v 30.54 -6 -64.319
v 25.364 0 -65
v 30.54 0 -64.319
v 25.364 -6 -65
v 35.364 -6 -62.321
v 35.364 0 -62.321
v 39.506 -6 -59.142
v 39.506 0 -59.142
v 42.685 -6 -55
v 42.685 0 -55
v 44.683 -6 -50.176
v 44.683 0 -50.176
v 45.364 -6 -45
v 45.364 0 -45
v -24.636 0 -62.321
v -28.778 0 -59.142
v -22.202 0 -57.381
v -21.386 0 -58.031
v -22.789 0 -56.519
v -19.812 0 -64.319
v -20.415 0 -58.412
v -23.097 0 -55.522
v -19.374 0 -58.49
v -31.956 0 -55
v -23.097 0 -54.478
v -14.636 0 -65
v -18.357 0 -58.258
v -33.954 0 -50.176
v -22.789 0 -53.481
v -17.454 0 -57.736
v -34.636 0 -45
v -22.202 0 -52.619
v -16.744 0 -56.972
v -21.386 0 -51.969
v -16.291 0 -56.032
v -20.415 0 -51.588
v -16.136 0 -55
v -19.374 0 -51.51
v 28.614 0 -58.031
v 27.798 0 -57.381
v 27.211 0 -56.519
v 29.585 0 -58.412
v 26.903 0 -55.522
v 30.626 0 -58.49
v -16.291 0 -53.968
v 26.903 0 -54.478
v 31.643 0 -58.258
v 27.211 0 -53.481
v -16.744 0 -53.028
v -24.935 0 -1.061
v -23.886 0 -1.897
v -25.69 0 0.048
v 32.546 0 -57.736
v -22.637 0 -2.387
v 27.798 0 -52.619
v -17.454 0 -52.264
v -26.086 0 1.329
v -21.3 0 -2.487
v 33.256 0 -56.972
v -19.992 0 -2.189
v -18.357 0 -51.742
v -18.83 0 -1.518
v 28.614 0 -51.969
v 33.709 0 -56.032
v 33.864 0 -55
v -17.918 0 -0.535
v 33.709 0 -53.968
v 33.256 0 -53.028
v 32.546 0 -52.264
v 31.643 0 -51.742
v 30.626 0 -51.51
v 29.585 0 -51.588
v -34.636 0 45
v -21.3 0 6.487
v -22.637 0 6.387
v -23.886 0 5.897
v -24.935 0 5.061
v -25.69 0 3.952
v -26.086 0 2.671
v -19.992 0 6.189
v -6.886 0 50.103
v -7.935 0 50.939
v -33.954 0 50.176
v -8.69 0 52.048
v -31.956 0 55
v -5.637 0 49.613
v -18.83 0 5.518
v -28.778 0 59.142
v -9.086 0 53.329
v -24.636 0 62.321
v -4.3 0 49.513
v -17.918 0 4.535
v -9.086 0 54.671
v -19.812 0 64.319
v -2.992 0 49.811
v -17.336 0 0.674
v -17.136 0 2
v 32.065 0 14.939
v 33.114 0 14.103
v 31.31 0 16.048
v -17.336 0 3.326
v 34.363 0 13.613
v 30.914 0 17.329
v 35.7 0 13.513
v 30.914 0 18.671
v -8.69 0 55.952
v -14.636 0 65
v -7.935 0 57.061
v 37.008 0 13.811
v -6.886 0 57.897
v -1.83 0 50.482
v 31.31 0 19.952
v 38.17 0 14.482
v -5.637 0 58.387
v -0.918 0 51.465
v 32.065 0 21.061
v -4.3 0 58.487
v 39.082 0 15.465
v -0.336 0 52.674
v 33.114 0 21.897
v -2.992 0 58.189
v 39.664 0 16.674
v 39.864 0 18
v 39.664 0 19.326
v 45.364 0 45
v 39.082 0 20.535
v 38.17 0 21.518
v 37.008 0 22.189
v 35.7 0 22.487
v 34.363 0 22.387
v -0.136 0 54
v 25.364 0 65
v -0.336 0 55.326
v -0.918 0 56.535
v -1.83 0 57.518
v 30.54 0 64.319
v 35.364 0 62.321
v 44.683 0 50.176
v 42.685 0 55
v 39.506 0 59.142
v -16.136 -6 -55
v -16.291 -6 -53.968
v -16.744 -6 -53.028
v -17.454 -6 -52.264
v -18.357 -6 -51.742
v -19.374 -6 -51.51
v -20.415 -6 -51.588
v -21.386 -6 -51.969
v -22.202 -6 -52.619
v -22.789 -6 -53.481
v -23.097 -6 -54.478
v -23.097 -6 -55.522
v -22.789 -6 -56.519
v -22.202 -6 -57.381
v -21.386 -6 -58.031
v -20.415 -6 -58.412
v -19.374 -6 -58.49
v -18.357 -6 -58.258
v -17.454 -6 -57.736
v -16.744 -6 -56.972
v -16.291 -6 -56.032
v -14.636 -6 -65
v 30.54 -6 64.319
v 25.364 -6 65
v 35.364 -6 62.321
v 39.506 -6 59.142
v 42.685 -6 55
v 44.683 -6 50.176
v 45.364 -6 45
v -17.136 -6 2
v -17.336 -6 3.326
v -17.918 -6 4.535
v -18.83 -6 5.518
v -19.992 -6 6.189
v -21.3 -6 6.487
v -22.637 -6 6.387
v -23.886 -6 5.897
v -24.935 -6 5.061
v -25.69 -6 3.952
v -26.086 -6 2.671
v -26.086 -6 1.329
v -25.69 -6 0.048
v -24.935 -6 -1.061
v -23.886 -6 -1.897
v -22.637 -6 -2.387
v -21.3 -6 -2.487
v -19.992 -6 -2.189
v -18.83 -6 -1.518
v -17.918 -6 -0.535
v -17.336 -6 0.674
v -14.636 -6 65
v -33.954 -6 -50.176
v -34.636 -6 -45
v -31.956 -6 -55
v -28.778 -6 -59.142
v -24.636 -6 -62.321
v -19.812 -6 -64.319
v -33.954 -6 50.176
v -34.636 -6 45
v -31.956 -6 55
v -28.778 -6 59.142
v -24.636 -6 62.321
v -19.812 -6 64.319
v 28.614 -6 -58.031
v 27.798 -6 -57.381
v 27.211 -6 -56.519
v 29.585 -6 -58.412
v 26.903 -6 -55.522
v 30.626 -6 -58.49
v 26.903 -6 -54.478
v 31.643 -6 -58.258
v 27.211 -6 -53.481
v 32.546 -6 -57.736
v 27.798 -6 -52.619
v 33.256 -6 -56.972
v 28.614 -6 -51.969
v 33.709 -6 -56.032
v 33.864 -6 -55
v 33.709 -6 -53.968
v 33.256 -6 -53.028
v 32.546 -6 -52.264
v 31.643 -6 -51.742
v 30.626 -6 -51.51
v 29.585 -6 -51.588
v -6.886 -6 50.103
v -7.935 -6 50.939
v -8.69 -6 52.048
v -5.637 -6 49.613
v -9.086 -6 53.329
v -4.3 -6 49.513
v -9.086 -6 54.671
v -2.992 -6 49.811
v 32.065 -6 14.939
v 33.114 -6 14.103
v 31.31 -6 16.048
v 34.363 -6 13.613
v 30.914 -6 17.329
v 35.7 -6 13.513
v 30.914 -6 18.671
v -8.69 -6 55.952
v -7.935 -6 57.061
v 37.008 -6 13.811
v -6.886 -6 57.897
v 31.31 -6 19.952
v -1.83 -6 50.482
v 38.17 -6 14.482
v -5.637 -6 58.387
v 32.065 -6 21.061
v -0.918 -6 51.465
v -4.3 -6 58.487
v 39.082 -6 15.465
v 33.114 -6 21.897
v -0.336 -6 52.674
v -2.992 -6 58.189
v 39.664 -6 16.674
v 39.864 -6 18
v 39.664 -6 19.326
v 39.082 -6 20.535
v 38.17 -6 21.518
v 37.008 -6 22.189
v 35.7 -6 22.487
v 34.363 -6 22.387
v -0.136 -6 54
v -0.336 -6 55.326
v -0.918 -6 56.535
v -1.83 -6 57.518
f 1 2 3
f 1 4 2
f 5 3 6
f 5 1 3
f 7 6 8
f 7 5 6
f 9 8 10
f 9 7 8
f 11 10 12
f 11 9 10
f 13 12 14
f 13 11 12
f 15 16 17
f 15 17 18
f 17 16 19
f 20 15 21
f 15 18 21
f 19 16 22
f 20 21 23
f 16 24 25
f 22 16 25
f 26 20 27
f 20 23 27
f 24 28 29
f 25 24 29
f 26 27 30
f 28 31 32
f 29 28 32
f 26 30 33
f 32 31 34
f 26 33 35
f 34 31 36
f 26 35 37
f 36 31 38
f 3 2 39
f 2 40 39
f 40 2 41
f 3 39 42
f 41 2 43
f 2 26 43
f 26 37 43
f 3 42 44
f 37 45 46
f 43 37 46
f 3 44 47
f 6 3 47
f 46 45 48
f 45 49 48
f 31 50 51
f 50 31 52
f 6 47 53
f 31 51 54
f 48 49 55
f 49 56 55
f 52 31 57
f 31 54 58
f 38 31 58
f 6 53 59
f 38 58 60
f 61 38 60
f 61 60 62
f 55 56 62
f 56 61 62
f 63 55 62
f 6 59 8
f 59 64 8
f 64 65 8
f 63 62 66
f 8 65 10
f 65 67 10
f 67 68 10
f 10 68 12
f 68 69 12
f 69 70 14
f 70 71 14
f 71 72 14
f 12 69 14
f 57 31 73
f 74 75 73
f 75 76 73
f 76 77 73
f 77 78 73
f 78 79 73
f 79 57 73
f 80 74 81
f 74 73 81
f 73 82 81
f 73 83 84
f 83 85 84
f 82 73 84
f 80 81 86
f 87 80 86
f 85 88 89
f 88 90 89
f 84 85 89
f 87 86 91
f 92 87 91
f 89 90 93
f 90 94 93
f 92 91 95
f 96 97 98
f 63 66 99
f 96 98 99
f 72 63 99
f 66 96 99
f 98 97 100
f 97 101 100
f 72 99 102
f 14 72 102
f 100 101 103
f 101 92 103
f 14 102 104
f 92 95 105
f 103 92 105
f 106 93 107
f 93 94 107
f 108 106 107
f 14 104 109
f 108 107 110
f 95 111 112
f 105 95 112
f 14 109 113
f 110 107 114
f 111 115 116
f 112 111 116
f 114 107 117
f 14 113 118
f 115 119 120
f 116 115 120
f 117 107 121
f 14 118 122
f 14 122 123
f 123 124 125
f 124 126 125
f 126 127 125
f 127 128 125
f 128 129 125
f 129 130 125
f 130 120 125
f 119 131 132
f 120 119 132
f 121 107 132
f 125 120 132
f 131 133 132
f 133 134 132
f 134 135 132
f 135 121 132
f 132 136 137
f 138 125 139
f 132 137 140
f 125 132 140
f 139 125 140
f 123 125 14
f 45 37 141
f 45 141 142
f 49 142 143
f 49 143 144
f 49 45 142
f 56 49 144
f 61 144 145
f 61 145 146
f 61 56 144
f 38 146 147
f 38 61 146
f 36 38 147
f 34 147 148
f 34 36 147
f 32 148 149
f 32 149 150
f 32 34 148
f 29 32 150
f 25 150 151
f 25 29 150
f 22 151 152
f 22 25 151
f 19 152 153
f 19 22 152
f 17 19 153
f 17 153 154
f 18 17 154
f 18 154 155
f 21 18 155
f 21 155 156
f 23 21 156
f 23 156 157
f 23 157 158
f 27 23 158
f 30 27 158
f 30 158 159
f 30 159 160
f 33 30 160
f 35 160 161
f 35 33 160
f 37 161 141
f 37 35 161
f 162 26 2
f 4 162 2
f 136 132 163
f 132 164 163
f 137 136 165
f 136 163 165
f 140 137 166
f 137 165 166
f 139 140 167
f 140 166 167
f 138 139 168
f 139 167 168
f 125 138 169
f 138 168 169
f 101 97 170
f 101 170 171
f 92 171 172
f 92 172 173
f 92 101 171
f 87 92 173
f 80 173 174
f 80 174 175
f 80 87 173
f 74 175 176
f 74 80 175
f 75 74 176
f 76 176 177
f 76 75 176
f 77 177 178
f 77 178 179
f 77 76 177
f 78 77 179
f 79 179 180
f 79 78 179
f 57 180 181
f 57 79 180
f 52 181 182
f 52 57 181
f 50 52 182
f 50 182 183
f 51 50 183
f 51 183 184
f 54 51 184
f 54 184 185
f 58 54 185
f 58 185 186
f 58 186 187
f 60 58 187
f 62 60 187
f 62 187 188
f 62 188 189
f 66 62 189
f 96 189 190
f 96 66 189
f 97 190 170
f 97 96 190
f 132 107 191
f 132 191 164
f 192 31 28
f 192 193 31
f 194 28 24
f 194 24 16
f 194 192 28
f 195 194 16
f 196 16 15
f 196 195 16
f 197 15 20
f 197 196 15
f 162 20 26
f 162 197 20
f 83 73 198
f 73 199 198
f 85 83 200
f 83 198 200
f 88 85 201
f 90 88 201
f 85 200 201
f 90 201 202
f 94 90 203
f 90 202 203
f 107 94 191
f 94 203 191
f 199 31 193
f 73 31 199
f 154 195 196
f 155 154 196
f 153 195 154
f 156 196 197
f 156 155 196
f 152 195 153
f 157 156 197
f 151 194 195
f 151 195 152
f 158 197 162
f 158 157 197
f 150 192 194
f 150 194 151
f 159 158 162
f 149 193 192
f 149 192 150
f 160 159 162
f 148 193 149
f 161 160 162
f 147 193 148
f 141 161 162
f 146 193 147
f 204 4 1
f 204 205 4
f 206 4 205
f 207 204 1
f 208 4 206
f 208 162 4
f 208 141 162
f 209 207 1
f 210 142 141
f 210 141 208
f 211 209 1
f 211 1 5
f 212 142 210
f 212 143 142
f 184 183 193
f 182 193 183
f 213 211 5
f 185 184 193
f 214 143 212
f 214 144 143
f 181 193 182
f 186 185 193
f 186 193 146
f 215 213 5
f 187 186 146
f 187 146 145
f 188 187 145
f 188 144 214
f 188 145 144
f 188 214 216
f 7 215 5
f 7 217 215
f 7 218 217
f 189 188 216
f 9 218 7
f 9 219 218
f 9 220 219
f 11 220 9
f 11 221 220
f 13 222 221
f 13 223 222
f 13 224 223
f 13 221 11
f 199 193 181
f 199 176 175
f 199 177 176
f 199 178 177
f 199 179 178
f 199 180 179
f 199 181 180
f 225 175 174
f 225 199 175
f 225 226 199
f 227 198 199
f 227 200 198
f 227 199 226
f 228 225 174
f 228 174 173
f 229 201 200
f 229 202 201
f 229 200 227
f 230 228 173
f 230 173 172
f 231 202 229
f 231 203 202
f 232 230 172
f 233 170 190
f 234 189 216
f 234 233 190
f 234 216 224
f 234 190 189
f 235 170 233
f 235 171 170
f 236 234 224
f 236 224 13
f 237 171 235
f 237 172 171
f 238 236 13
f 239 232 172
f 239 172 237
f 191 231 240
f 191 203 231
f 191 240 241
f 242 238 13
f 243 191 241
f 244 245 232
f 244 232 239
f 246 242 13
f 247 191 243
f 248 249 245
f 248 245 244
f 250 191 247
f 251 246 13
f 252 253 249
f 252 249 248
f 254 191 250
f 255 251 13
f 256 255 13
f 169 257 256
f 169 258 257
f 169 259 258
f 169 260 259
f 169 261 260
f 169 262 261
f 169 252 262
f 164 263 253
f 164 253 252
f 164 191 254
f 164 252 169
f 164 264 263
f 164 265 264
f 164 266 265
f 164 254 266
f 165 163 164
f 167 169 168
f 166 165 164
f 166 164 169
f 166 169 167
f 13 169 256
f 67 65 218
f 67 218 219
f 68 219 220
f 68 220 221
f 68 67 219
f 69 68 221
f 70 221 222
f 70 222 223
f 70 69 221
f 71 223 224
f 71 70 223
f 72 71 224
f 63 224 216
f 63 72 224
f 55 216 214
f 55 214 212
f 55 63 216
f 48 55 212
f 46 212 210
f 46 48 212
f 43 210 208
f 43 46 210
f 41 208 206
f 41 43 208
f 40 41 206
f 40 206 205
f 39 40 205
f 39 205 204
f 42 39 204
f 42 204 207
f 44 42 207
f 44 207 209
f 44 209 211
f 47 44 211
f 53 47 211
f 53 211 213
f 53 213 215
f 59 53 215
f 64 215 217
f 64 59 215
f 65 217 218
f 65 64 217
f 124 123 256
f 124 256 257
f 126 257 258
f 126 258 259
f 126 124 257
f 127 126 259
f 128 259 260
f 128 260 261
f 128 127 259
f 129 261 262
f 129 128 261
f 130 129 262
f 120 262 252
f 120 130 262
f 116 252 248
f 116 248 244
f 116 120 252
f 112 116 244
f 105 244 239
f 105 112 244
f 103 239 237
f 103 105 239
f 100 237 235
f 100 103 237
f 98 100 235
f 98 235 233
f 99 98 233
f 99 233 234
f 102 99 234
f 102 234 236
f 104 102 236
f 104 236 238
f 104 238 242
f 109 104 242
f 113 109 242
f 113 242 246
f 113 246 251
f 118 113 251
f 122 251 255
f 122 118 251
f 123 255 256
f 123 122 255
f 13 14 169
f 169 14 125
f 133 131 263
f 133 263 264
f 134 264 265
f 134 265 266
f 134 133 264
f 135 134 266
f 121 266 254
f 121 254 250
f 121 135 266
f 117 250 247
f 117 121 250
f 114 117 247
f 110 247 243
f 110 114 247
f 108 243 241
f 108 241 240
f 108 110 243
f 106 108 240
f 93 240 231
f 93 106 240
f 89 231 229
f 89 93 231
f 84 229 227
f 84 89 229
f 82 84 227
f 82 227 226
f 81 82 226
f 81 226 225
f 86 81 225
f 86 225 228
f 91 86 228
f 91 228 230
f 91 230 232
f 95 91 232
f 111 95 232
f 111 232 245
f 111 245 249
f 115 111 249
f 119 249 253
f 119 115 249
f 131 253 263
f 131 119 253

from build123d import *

# Parameters (mm, degrees)
F0_W     = 80
F0_H     = 130
F0_R     = 3.5
F0_R_2   = 4.5
F1_DEPTH = 6
F2_R     = 20


with BuildPart() as f1:
    # F0 (on Front) → F1 (new body)
    with BuildSketch(Plane.XZ):
        with Locations((5.364077, 0)):
            Rectangle(F0_W, F0_H)
        with Locations((-19.635923, -55)):
            Circle(F0_R, mode=Mode.SUBTRACT)
        with Locations((30.364077, -55)):
            Circle(F0_R, mode=Mode.SUBTRACT)
        with Locations((-21.635923, 2)):
            Circle(F0_R_2, mode=Mode.SUBTRACT)
        with Locations((-4.635923, 54)):
            Circle(F0_R_2, mode=Mode.SUBTRACT)
        with Locations((35.364077, 18)):
            Circle(F0_R_2, mode=Mode.SUBTRACT)
    extrude(amount=F1_DEPTH)

    # F2
    f2_edges = [f1.edges().sort_by_distance(p)[0] for p in [
        (45.364077, -3, 65),
        (-34.635923, -3, 65),
        (-34.635923, -3, -65),
        (45.364077, -3, -65),
    ]]
    fillet(f2_edges, radius=F2_R)


solid = f1.part
